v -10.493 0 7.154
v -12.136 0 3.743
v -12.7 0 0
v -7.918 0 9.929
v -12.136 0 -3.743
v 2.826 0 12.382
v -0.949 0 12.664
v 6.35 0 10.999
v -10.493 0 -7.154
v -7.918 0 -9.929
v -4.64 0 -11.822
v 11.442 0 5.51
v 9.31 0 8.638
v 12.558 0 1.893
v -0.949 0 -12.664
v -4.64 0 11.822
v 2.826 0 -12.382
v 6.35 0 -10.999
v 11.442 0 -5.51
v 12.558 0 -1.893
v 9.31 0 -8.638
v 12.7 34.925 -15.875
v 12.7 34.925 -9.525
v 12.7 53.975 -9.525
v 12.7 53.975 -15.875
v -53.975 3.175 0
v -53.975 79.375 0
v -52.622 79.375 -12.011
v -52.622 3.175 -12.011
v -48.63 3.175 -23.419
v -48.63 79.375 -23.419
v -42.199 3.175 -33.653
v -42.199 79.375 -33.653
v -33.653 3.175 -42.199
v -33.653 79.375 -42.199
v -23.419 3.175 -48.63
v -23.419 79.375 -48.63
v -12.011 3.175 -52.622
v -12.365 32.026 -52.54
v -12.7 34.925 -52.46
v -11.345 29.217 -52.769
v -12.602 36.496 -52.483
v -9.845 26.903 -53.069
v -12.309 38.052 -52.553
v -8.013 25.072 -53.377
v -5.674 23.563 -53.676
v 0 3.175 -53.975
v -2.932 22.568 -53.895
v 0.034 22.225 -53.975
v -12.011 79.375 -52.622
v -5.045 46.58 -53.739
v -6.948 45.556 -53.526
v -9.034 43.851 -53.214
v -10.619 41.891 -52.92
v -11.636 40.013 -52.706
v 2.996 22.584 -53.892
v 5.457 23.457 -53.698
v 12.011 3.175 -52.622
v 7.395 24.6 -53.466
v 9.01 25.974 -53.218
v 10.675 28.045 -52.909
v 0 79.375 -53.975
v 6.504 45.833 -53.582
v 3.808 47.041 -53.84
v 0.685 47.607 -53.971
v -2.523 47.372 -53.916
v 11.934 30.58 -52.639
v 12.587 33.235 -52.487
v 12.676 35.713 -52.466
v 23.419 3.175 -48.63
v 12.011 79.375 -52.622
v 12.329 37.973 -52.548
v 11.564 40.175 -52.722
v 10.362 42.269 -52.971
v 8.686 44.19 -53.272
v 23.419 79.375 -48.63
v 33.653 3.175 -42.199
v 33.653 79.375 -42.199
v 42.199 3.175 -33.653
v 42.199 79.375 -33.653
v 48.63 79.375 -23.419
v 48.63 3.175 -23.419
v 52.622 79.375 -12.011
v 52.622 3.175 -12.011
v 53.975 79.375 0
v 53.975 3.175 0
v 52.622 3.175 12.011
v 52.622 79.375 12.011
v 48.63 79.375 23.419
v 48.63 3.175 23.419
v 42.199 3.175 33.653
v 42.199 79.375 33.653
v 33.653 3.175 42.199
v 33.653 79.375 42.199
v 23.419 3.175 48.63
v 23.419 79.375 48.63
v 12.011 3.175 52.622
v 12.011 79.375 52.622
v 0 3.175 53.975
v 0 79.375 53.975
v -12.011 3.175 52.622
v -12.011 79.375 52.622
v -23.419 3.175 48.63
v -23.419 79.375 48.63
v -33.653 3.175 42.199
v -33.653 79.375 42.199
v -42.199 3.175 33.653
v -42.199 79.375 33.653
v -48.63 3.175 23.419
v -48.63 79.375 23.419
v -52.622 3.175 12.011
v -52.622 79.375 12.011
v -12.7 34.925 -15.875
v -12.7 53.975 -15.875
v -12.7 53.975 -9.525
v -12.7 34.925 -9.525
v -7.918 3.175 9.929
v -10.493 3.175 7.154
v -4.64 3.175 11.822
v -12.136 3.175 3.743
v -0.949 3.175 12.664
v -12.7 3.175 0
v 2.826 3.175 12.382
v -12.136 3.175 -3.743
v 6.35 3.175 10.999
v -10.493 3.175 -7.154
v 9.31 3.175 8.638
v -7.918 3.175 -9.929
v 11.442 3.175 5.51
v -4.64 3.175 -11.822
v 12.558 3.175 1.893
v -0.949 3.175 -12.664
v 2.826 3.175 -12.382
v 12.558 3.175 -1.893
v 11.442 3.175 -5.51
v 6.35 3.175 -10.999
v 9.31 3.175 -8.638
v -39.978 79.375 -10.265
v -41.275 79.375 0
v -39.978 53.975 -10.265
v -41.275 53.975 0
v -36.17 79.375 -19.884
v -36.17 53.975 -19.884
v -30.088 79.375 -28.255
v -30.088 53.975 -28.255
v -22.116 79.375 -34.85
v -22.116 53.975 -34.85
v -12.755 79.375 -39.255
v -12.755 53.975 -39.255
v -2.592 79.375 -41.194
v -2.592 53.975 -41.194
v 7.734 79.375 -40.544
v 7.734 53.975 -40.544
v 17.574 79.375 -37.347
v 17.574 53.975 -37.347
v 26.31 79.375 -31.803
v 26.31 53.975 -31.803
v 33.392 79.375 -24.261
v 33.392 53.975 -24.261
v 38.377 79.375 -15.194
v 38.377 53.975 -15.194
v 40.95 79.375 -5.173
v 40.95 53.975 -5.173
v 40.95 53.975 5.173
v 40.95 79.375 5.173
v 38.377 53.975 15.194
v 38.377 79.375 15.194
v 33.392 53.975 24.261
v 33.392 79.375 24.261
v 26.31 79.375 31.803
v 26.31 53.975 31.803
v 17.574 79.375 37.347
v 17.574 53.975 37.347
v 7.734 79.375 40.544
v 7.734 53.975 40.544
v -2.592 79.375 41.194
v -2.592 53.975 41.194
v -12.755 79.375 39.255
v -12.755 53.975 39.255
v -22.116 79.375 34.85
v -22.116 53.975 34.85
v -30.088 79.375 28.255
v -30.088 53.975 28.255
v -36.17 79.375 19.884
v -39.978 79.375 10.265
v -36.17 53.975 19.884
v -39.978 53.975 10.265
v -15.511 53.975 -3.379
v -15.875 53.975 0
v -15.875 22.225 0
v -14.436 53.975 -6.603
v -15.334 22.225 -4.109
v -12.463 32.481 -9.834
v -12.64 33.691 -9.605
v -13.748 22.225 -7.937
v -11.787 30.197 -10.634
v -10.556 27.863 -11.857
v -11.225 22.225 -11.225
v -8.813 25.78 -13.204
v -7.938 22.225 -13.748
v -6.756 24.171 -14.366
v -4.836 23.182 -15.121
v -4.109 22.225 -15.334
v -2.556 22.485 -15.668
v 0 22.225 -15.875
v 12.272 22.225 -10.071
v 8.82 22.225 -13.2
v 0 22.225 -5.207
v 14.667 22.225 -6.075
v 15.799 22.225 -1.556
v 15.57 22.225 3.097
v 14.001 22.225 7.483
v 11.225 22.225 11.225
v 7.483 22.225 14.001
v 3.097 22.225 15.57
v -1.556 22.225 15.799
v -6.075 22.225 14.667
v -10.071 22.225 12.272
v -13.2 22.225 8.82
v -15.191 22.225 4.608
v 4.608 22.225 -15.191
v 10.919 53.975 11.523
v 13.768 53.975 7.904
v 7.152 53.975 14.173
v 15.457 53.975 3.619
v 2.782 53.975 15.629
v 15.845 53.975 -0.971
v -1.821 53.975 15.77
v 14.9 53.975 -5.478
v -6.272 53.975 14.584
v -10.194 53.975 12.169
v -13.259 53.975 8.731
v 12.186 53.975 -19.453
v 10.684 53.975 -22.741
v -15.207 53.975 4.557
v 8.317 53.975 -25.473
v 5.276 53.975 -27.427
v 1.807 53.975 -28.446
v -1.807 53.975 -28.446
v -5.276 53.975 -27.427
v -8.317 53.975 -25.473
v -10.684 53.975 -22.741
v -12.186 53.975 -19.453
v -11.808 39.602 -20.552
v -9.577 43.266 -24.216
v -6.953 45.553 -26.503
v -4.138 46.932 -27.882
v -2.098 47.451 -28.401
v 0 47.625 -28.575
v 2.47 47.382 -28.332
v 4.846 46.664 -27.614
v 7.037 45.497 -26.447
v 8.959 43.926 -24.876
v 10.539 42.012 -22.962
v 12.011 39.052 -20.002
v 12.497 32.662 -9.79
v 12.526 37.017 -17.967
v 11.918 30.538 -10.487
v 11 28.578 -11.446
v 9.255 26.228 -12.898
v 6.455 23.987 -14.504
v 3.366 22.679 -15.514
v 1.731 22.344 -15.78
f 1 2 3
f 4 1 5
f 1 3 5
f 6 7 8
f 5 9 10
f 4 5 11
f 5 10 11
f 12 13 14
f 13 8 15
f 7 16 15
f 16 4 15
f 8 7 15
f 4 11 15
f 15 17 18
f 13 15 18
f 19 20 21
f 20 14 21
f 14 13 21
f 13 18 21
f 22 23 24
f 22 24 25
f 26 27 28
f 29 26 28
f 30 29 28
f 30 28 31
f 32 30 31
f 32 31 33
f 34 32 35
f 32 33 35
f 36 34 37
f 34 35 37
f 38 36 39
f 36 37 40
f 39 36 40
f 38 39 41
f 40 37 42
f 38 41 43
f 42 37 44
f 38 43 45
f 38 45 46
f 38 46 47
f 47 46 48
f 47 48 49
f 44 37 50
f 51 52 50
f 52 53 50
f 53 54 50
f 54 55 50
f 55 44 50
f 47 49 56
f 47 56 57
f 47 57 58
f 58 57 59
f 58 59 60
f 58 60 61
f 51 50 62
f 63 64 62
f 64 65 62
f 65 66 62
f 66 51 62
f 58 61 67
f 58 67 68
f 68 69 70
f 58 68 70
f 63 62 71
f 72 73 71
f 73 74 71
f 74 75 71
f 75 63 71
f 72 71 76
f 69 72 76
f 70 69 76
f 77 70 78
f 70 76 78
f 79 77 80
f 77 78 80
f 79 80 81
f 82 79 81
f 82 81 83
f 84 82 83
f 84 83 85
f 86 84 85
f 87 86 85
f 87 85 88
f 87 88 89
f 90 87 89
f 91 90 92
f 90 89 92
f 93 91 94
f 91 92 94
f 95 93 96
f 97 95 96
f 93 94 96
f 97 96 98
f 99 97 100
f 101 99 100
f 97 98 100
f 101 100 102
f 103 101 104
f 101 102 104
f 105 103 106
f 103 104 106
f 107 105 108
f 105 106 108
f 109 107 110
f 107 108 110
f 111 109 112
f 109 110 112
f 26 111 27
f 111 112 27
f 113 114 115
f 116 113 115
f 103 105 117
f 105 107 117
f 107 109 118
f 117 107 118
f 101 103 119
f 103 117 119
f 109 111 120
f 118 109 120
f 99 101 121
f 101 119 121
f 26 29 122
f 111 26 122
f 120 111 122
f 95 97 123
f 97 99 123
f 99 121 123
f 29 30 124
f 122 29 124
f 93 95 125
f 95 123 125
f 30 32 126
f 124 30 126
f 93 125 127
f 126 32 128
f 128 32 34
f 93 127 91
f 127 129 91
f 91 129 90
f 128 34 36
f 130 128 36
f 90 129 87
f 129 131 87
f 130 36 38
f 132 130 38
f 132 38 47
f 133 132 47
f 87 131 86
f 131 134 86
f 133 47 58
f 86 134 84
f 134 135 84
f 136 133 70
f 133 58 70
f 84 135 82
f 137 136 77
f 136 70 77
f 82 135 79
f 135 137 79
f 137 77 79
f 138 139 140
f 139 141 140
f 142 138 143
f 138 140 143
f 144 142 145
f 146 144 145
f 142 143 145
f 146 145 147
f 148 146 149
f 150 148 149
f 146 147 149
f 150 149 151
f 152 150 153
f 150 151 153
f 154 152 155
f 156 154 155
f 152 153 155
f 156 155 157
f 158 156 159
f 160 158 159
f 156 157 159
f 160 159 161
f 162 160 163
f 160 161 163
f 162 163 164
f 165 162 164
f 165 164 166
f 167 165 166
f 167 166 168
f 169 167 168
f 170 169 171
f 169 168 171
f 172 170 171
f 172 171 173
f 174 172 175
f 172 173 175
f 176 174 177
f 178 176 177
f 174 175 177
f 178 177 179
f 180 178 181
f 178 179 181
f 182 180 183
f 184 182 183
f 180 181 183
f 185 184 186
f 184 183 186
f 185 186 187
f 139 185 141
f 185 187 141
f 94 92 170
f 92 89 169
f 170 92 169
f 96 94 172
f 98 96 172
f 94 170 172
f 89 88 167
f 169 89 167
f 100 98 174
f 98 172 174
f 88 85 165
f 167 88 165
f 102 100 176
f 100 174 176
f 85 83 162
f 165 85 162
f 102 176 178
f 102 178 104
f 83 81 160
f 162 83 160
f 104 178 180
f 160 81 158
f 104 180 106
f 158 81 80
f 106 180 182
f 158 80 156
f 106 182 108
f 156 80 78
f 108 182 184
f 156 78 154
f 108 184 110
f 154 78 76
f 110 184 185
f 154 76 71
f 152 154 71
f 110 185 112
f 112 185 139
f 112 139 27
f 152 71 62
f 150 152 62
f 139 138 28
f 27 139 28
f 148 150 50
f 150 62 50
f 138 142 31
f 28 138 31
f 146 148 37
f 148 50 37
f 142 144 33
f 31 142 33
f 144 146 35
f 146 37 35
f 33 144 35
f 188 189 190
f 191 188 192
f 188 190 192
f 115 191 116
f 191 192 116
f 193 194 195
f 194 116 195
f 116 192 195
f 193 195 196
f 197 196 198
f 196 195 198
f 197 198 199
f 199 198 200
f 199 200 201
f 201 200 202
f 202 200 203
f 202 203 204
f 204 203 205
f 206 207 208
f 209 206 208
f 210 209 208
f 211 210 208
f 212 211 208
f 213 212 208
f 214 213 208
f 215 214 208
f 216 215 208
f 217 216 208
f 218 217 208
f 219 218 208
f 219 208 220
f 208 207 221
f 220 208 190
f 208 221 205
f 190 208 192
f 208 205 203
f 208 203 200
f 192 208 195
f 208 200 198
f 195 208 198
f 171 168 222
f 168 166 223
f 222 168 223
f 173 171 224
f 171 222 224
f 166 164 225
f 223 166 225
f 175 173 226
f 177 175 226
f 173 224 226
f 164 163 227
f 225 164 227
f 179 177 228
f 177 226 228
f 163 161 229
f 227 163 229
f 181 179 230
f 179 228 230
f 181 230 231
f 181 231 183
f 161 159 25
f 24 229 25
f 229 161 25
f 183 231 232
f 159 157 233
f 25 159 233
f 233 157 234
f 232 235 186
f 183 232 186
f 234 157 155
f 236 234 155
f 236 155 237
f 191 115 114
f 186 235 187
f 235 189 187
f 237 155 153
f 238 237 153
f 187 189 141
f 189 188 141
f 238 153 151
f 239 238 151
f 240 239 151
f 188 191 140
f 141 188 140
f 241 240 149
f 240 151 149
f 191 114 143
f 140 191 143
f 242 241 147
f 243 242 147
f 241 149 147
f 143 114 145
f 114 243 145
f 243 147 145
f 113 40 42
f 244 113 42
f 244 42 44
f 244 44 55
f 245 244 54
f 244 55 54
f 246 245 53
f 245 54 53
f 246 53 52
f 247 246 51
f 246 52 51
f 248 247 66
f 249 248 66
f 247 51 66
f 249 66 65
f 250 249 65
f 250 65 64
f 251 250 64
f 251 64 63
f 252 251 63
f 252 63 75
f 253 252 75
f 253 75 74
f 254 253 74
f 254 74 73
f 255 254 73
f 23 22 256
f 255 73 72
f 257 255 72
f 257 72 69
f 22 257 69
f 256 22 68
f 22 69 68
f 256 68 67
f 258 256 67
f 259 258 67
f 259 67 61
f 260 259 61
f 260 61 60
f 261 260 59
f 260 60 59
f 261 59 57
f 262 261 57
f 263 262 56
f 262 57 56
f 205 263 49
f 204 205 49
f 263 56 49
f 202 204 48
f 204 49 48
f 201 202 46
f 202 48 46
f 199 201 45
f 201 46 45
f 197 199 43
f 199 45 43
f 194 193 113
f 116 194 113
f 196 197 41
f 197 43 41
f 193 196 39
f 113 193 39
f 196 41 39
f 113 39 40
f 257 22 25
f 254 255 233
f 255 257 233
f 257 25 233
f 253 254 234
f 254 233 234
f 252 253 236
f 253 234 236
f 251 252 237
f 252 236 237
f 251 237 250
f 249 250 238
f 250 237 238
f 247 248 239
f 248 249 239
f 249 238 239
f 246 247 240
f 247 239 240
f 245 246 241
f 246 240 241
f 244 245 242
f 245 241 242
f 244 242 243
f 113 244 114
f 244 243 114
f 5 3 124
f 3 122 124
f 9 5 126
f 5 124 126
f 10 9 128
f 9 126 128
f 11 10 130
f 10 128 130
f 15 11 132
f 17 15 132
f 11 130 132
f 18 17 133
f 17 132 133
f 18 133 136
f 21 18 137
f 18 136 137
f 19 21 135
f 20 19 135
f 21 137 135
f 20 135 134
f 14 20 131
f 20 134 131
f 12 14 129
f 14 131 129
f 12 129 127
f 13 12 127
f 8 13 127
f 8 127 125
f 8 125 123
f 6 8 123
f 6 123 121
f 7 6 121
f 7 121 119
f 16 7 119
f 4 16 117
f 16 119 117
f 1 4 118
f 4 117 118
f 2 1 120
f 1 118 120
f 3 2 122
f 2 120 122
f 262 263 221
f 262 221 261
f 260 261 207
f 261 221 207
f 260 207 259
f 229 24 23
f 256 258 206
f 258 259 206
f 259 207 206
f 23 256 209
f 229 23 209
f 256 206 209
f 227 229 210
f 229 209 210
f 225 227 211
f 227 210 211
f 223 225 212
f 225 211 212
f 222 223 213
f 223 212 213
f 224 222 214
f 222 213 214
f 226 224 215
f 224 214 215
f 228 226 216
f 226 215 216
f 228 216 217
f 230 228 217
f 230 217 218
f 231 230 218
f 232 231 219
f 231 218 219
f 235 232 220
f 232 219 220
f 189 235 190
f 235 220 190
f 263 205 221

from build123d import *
from build123d.topology import SkipClean

# Parameters (mm, degrees)
SKETCH3_R          = 12.7
CUT_EXTRUDE1_DEPTH = 48.768
CUT_EXTRUDE2_DEPTH = 19.05


with BuildPart() as part:
    # Sketch1 → Revolve1 (revolve)
    with BuildSketch(Plane.XY, mode=Mode.PRIVATE) as revolve1_sk:
        Polygon((0, 0), (12.7, 0), (12.7, 3.175), (53.975, 3.175), (53.975, 79.375), (41.275, 79.375), (41.275, 53.975), (15.875, 53.975), (15.875, 22.225), (0, 22.225), align=None)
    revolve(revolve1_sk.sketch.rotate(Axis((0, 22.225, 0), (0, -1, 0)), 180), axis=Axis((0, 22.225, 0), (0, -1, 0)))

    # Sketch3 → Cut-Extrude1 (cut)
    with BuildSketch(Plane(origin=(0, 0, -53.975), x_dir=(-1, 0, 0), z_dir=(0, 0, -1))):
        with Locations((0, 34.925)):
            Circle(SKETCH3_R)
    extrude(amount=-CUT_EXTRUDE1_DEPTH, mode=Mode.SUBTRACT)

    # Sketch4 → Cut-Extrude2 (cut)
    with SkipClean():  # the faces are left unmerged after this step: merging them gives an invalid solid
        with BuildSketch(Plane(origin=(0, 53.975, 0), x_dir=(1, 0, 0), z_dir=(0, 1, 0))):
            with BuildLine():
                Line((-12.7, 15.875), (-12.7, 0))
                Line((-12.7, 0), (12.7, 0))
                Line((12.7, 0), (12.7, 15.875))
                ThreePointArc((12.7, 15.875), (0, 28.575), (-12.7, 15.875))
            make_face()
        extrude(amount=-CUT_EXTRUDE2_DEPTH, mode=Mode.SUBTRACT)


solid = part.part
